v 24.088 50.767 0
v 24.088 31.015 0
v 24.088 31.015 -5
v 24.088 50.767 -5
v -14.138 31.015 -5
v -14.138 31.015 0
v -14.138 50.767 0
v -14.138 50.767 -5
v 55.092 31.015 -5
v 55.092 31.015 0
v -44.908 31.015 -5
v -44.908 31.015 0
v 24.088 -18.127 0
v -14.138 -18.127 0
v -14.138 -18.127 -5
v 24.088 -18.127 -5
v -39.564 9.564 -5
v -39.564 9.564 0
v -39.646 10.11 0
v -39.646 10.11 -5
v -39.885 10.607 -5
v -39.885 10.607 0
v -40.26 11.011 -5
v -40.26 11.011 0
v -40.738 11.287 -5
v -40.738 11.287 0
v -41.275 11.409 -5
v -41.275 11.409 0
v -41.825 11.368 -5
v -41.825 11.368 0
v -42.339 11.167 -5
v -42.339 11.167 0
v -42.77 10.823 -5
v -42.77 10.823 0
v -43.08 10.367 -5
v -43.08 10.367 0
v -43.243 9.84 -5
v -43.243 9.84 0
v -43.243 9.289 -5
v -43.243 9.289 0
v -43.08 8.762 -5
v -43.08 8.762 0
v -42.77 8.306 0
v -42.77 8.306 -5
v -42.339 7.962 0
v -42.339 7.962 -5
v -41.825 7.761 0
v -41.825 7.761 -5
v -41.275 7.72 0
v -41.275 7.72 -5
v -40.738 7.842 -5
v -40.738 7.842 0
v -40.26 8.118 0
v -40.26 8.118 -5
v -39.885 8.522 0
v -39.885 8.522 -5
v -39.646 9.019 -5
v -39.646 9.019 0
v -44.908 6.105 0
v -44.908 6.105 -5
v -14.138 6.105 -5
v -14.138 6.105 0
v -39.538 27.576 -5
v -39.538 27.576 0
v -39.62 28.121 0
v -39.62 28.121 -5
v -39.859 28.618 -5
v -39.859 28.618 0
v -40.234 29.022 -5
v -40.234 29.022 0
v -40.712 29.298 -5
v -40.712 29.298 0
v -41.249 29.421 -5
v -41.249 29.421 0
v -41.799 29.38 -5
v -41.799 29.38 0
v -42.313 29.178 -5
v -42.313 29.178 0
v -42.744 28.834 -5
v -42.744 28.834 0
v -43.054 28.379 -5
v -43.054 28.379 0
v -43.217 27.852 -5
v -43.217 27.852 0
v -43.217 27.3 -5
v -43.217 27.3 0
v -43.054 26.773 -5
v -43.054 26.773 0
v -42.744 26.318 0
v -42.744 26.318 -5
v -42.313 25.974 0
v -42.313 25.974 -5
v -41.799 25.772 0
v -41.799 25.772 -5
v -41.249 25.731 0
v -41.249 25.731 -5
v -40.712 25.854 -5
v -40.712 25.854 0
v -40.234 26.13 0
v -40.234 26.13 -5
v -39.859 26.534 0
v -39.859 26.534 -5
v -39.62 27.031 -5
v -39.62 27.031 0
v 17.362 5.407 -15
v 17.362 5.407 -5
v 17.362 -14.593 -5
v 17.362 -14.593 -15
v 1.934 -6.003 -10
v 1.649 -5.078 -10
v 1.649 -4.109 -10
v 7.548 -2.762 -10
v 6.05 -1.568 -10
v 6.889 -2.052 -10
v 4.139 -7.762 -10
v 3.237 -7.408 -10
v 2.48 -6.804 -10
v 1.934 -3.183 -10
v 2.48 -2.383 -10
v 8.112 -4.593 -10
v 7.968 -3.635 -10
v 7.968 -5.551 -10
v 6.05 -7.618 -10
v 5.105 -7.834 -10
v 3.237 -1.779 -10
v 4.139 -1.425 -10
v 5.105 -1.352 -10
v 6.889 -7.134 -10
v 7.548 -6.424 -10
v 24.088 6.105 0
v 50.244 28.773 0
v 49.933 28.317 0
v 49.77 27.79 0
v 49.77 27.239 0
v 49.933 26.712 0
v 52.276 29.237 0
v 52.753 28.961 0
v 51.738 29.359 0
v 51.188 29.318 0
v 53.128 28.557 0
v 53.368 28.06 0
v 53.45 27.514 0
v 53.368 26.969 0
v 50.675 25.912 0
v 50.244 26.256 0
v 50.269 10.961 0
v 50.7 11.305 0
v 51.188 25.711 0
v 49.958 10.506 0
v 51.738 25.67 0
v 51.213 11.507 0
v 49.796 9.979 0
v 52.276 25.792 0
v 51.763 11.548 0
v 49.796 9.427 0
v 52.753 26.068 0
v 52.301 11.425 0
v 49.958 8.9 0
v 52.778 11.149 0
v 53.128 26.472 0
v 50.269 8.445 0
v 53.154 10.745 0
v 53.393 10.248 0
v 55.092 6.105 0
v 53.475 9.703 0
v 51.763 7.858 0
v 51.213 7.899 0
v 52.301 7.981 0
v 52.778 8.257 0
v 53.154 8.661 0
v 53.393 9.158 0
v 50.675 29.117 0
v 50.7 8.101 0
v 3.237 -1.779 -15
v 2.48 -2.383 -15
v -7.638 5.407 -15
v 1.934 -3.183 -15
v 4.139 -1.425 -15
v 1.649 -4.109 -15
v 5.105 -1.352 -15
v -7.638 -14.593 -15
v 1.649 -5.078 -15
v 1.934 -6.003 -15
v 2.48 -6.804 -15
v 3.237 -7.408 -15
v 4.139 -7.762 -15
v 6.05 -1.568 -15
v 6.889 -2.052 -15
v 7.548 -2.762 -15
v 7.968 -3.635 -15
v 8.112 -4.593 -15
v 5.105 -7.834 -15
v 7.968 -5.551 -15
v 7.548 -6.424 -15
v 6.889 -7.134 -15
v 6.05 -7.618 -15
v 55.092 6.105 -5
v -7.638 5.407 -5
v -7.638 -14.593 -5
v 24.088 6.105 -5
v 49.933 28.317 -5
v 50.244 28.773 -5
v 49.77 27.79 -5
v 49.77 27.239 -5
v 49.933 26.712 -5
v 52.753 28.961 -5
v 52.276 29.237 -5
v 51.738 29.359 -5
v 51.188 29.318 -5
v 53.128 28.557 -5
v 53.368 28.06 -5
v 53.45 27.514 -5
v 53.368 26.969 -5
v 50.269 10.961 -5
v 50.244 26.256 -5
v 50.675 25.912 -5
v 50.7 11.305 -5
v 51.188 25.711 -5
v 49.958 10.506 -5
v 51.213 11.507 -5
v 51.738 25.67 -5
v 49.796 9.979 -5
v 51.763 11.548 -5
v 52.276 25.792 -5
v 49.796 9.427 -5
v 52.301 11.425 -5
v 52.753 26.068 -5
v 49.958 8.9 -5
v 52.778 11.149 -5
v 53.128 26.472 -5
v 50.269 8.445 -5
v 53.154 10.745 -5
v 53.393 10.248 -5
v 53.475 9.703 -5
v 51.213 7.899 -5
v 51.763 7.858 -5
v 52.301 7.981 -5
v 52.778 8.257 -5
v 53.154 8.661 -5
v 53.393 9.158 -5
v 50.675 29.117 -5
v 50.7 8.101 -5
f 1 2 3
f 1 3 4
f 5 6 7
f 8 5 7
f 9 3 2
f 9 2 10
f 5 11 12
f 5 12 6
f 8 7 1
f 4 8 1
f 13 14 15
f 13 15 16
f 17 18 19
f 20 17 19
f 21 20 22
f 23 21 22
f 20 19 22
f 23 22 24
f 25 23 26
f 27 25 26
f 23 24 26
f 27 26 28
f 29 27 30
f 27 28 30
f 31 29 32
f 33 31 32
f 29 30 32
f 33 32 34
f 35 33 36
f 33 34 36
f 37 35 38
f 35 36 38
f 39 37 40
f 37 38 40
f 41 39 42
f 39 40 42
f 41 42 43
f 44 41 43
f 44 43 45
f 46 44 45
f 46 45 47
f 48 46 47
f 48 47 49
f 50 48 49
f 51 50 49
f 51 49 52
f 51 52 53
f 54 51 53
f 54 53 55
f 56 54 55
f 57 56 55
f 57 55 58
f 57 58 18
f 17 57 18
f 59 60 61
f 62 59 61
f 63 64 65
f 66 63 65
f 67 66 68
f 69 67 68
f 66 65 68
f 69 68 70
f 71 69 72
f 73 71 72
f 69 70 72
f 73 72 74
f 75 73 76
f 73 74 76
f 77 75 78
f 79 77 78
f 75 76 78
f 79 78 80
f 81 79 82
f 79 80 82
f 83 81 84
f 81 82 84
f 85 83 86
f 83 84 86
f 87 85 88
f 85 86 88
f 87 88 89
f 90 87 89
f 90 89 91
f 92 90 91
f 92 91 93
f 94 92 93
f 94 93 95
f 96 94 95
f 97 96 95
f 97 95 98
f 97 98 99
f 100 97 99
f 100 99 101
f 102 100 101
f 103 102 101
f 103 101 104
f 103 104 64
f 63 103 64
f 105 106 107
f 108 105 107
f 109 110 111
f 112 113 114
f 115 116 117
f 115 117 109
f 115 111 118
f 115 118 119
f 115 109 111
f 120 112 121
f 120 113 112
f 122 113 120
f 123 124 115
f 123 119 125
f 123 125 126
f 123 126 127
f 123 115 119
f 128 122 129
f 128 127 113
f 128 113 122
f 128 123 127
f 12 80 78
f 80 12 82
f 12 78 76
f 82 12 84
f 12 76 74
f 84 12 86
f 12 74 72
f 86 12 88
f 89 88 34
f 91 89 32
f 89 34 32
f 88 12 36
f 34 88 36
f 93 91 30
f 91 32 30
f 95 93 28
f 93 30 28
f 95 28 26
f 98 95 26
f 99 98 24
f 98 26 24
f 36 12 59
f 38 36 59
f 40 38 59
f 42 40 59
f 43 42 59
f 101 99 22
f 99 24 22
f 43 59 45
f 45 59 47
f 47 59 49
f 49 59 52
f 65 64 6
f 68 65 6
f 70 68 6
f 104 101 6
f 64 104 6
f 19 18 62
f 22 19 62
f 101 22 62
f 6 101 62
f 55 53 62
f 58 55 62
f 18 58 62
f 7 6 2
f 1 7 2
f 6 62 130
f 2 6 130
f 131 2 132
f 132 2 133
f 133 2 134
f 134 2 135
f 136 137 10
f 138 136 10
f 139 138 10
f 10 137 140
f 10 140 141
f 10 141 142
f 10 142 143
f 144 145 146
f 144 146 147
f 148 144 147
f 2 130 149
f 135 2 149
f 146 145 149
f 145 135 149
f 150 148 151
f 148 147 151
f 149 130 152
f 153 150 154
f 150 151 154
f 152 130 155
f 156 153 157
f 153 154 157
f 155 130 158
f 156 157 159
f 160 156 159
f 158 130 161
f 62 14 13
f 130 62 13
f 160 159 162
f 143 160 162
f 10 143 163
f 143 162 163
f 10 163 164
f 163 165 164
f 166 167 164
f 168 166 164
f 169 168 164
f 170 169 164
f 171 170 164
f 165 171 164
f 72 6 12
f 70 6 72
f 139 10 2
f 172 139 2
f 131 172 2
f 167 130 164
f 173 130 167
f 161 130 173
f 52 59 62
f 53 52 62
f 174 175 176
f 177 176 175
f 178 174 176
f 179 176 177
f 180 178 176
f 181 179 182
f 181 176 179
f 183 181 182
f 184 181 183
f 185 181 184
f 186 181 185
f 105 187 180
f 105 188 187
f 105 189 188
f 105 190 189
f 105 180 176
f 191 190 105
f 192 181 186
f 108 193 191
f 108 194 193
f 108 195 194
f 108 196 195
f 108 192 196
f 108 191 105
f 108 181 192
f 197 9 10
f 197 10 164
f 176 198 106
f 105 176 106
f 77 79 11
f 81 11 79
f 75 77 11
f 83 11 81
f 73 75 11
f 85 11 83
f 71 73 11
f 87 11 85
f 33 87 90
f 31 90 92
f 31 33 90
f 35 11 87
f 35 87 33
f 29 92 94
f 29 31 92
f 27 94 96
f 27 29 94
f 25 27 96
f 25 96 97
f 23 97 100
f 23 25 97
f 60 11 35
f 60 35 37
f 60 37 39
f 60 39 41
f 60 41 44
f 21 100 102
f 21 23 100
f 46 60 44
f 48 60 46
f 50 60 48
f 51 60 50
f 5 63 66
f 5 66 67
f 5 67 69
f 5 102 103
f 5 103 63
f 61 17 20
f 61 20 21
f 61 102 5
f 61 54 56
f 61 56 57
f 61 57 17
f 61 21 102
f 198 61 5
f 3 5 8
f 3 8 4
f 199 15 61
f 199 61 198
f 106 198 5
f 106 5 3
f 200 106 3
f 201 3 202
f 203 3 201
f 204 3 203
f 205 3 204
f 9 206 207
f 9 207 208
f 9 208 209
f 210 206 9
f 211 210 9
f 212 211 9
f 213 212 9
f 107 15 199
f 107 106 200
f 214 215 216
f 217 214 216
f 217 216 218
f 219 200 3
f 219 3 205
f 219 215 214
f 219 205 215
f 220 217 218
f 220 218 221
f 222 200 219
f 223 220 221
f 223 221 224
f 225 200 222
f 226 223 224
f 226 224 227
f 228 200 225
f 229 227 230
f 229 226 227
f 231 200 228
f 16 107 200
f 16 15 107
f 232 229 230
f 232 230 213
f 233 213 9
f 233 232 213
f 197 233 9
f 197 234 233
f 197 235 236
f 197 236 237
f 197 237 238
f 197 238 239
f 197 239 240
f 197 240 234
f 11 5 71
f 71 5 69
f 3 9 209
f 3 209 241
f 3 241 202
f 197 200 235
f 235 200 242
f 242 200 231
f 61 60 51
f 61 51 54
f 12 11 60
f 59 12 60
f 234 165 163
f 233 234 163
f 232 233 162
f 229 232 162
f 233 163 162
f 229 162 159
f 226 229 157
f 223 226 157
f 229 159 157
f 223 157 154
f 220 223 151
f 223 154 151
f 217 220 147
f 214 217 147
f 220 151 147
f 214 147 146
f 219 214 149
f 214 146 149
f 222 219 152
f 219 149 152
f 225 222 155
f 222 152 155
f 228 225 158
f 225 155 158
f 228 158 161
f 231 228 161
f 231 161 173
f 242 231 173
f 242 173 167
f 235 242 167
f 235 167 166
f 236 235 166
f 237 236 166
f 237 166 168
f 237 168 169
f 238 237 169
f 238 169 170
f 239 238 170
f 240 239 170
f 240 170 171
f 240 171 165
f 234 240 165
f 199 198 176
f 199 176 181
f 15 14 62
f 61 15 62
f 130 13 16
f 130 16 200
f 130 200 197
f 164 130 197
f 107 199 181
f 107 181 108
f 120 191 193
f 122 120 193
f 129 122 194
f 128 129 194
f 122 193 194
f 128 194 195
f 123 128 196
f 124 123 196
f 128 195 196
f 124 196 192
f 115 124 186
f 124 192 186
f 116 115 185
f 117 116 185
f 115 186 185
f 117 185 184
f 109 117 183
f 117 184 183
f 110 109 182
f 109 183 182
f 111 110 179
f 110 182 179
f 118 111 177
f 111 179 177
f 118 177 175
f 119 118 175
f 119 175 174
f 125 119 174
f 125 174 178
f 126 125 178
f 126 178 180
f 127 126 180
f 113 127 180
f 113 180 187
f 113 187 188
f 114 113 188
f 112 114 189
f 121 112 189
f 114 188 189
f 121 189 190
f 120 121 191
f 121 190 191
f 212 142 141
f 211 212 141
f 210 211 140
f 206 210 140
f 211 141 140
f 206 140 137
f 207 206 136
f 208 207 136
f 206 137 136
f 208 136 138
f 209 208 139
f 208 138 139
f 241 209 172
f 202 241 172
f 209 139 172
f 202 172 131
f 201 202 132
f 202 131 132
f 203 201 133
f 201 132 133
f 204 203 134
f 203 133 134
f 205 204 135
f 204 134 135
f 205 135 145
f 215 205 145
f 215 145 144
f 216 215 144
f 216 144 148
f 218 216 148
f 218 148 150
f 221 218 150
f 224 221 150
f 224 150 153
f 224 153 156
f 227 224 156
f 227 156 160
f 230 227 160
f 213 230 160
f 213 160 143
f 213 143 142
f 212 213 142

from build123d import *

# Parameters (mm, degrees)
F0_W     = 38.225519
F0_H     = 68.893833
F1_DEPTH = 5
F2_W     = 100
F2_H     = 24.910029
F3_DEPTH = 5
F4_R     = 1.85
F5_DEPTH = 25.4
F6_W     = 25
F6_H     = 20
F7_DEPTH = 10
F8_R     = 3.25
F9_DEPTH = 5


with BuildPart() as f1:
    # F0 (on Top) → F1 (new body)
    with BuildSketch(Plane.XY):
        with Locations((4.975074, 16.320151)):
            Rectangle(F0_W, F0_H)
    extrude(amount=-F1_DEPTH)

    # F2 (on face) → F3 (join)
    with BuildSketch(Plane(origin=(0, 0, -5), x_dir=(1, 0, 0), z_dir=(0, 0, -1))):
        with Locations((5.092296, -18.559826)):
            Rectangle(F2_W, F2_H)
    extrude(amount=-F3_DEPTH)

    # F4 (on face) → F5 (cut)
    with BuildSketch(Plane.XY):
        with Locations((-41.387634, 27.575926)):
            Circle(F4_R)
        with Locations((51.599746, 27.514396)):
            Circle(F4_R)
        with Locations((-41.413683, 9.564399)):
            Circle(F4_R)
        with Locations((51.624972, 9.70294)):
            Circle(F4_R)
    extrude(amount=-F5_DEPTH, mode=Mode.SUBTRACT)

    # F6 (on face) → F7 (join)
    with BuildSketch(Plane(origin=(0, 0, -5), x_dir=(1, 0, 0), z_dir=(0, 0, -1))):
        with Locations((4.862315, 4.593138)):
            Rectangle(F6_W, F6_H)
    extrude(amount=F7_DEPTH)

    # F8 (on face) → F9 (cut)
    with BuildSketch(Plane(origin=(0, 0, -15), x_dir=(1, 0, 0), z_dir=(0, 0, -1))):
        with Locations((4.862315, 4.593138)):
            Circle(F8_R)
    extrude(amount=-F9_DEPTH, mode=Mode.SUBTRACT)


solid = f1.part
